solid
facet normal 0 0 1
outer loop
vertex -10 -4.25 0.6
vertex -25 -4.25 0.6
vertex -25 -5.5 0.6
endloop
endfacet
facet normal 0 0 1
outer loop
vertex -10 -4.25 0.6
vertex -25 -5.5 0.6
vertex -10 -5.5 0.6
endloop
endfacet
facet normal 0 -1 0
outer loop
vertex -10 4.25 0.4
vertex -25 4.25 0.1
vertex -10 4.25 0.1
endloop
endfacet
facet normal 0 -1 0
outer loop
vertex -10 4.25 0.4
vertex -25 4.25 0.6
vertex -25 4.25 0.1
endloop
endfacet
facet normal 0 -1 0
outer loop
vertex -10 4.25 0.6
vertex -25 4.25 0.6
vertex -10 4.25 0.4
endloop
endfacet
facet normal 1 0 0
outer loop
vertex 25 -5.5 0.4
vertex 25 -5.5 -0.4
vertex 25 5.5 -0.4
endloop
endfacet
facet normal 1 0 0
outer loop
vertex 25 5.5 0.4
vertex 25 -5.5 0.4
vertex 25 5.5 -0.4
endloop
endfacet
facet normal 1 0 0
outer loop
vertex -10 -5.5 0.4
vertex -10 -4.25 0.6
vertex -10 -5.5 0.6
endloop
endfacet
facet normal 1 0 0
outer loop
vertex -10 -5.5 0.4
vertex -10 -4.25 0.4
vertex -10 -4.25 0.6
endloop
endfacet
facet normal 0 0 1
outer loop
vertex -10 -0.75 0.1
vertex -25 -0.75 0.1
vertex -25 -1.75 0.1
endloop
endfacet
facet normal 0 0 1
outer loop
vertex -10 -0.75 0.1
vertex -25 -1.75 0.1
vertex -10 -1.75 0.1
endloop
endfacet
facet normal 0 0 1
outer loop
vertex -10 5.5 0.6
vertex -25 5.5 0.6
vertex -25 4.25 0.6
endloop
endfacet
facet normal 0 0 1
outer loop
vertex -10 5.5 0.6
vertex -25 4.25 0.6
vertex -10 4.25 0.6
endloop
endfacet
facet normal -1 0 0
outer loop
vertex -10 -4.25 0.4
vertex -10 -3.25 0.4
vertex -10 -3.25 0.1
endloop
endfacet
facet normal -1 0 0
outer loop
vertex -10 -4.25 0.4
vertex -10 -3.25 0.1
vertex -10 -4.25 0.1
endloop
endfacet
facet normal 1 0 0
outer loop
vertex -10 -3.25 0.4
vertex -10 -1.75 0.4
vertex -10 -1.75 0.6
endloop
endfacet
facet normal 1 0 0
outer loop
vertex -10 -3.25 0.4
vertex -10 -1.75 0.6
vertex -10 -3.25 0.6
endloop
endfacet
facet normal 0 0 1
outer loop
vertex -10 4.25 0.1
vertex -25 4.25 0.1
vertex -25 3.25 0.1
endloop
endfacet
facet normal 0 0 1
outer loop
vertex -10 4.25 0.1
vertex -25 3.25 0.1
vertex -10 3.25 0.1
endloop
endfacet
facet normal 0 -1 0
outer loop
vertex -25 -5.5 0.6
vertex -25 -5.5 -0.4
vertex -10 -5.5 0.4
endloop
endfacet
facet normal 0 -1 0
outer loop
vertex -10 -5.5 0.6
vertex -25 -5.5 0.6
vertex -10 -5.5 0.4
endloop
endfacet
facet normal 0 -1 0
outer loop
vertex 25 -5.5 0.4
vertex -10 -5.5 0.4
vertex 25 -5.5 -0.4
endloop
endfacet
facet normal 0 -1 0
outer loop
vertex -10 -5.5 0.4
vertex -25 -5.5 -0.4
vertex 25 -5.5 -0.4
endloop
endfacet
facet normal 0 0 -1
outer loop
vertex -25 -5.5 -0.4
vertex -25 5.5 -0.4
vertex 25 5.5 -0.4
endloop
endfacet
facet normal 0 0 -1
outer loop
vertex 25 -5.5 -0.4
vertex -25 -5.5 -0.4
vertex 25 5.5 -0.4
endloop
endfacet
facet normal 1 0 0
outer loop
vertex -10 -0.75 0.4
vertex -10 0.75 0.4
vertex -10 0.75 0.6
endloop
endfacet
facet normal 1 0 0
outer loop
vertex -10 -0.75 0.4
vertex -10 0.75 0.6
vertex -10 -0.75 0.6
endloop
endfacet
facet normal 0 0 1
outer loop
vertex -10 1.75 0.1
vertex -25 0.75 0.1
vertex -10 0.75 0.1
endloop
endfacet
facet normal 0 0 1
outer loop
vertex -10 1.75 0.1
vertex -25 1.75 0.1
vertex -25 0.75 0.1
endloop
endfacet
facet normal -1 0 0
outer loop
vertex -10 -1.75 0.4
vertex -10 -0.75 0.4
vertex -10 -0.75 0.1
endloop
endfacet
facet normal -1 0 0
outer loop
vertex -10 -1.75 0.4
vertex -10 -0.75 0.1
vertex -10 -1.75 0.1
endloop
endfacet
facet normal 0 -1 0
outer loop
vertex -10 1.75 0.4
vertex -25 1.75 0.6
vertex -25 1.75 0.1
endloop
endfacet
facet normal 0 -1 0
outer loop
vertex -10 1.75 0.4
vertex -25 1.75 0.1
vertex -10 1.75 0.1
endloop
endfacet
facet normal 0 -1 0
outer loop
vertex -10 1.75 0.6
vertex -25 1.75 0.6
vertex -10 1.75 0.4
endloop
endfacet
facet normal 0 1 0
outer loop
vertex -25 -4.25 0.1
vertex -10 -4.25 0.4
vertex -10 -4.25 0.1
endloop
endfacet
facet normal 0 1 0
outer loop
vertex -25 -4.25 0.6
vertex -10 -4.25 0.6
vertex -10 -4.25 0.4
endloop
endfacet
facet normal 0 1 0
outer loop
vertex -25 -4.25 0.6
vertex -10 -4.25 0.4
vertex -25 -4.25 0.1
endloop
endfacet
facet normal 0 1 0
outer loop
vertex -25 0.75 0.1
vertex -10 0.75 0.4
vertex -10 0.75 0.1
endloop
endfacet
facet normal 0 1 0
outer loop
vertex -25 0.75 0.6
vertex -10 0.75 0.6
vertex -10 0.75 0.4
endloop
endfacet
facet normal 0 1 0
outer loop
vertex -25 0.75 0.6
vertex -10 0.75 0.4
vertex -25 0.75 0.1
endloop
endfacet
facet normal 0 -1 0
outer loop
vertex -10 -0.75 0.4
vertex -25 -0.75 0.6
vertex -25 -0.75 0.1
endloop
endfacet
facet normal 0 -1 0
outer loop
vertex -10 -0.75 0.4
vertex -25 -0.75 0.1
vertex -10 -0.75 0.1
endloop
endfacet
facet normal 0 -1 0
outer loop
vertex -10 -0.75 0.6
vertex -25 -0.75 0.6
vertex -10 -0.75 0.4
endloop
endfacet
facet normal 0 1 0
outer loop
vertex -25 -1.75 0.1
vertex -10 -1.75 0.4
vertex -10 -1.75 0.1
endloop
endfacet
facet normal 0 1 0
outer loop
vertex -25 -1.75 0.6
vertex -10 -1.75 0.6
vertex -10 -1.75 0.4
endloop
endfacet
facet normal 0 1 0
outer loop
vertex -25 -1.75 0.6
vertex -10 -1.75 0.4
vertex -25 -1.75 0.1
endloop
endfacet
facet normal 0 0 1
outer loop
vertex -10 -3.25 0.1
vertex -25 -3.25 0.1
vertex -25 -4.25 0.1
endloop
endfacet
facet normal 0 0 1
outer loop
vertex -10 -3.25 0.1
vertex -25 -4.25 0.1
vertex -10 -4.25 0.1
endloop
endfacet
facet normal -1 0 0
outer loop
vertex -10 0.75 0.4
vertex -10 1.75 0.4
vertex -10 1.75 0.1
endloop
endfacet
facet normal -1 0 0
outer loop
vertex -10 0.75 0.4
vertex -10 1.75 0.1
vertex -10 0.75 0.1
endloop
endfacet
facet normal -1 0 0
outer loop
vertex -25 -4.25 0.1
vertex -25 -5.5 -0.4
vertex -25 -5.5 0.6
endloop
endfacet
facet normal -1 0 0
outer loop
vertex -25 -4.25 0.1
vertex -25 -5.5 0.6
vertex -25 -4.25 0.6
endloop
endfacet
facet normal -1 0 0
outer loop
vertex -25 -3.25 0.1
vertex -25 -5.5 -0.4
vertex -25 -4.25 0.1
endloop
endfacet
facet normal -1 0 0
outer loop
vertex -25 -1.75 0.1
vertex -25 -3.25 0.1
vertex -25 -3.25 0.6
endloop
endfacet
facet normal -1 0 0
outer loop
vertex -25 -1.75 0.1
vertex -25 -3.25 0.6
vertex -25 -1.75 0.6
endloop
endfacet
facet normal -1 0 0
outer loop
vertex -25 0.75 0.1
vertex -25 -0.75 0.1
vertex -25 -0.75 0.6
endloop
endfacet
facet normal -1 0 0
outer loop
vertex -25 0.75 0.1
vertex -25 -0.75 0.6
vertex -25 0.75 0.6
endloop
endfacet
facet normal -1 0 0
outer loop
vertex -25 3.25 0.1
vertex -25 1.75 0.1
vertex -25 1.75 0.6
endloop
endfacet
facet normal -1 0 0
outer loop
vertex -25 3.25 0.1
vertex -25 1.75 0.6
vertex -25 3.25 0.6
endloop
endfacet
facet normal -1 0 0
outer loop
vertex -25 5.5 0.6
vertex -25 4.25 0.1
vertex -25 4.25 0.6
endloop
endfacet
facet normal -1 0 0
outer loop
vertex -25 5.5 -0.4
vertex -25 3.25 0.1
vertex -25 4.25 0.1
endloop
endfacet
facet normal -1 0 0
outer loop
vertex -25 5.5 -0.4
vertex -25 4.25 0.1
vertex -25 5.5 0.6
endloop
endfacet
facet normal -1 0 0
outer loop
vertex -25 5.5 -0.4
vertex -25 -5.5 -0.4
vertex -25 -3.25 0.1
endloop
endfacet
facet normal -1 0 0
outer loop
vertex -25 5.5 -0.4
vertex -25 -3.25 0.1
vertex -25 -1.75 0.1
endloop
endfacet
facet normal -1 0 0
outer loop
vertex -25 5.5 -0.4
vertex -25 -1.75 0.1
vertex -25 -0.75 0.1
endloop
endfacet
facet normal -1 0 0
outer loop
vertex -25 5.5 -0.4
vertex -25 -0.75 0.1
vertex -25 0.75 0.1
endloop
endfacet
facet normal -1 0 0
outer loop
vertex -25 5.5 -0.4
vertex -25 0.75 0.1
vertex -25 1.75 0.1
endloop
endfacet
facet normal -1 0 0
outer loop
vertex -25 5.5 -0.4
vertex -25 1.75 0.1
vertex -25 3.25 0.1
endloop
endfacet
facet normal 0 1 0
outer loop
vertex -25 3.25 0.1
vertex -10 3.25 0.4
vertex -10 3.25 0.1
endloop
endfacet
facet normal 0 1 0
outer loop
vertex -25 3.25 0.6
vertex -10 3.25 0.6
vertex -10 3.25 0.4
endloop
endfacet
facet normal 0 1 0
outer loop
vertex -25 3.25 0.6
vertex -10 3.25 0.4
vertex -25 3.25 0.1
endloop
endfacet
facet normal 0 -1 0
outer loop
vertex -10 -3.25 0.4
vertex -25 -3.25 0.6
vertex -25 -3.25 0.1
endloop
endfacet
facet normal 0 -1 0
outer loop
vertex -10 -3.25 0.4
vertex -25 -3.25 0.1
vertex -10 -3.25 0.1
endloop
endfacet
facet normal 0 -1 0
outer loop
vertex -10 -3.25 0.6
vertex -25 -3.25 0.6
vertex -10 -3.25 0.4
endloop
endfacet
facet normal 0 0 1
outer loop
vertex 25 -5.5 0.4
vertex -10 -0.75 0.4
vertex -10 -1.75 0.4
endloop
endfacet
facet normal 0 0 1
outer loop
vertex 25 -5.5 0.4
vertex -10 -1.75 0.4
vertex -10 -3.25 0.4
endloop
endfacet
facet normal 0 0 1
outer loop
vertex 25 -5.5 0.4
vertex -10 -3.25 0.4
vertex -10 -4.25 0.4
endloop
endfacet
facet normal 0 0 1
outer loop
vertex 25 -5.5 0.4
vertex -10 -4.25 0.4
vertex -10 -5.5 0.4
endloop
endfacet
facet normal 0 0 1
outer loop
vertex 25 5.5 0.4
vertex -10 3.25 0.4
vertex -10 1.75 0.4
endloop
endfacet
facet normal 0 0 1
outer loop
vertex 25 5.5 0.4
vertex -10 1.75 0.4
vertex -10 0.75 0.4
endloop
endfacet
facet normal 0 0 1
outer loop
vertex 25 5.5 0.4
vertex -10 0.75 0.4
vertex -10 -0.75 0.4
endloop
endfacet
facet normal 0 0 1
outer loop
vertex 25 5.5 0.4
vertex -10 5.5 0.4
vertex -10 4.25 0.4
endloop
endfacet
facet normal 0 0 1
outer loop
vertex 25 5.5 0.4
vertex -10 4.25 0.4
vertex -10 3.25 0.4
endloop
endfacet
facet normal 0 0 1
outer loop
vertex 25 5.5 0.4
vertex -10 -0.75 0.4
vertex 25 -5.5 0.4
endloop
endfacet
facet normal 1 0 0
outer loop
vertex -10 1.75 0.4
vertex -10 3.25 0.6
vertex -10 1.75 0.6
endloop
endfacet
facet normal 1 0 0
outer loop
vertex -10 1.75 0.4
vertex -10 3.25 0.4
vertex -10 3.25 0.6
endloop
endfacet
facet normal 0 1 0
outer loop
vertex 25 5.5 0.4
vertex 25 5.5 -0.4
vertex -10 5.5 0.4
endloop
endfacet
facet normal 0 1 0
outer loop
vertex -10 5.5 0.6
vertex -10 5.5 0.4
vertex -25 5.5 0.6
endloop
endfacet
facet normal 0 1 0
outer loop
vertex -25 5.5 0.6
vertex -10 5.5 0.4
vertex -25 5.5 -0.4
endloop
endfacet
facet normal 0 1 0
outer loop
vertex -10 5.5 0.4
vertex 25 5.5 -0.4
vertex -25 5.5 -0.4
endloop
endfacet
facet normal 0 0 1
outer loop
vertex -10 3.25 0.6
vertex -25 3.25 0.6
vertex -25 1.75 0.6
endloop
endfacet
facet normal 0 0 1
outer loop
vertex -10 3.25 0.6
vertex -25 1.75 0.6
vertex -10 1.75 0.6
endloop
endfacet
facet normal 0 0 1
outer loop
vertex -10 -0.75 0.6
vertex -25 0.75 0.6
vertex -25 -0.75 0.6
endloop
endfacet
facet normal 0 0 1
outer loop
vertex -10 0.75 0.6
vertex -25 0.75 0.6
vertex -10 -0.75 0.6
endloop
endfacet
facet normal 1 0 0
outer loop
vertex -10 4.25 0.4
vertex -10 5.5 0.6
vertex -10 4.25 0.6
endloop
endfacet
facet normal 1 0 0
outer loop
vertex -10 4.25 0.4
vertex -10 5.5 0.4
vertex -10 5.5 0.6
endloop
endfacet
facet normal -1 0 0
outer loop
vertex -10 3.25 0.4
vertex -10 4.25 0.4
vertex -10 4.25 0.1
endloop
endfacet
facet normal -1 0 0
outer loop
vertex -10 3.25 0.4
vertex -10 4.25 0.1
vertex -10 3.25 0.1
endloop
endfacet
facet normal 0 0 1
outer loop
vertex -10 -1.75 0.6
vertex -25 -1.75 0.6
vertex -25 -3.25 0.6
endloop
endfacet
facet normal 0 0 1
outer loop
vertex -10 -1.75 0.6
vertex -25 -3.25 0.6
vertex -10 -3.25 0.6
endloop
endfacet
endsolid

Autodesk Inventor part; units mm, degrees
ref_plane "YZ Plane" through (0, 0, 0) normal (1, 0, 0) x (0, 1, 0)
ref_plane "XZ Plane" through (0, 0, 0) normal (0, 1, 0) x (-1, 0, 0)
sketch "Sketch1" plane through (0, 0, 0) normal (0, 0, 1) x (1, 0, 0)
  line L0 (-25, -5.5) -> (25, -5.5)
  line L1 (25, -5.5) -> (25, 5.5)
  line L2 (25, 5.5) -> (-25, 5.5)
  line L3 (-25, 5.5) -> (-25, -5.5)
  line L4 (-25, -5.5) -> (25, 5.5) construction
  line L5 (25, -5.5) -> (-25, 5.5) construction
  point P0 (0, 0)
  dimension "d0" = 50
  dimension "d1" = 11
extrude "Extrusion1" add sketch "Sketch1" along normal mid plane 0.8
sketch "Sketch2" plane through (0, 0, 0.4) normal (0, 0, 1) x (1, 0, 0)
  line L0 (25, 5.5) -> (-25, 5.5) projected
  line L1 (-25, -5.5) -> (25, -5.5) projected
  line L2 (-25, 5.5) -> (-10, 5.5)
  line L3 (-10, 5.5) -> (-10, -5.5)
  line L4 (-10, -5.5) -> (-25, -5.5)
  line L5 (-25, -5.5) -> (-25, 5.5)
  point P0 (0, 0)
  dimension "d4" = 15
  dimension "d5" = 11
extrude "Extrusion2" add sketch "Sketch2" along normal blind 0.2
sketch "Sketch3" plane through (0, 0, 0.6) normal (0, 0, 1) x (1, 0, 0)
  line L0 (-25, 4.25) -> (-10, 4.25)
  line L1 (-10, 4.25) -> (-10, 3.25)
  line L2 (-10, 3.25) -> (-25, 3.25)
  line L3 (-25, 3.25) -> (-25, 4.25)
  line L4 (-25, 5.5) -> (-25, -5.5) projected
  line L5 (-10, 5.5) -> (-25, 5.5) projected
  line L6 (-10, 0.75) -> (-25, 0.75)
  line L7 (-10, 1.75) -> (-10, 0.75)
  line L8 (-25, 1.75) -> (-10, 1.75)
  line L9 (-25, 0.75) -> (-25, 1.75)
  line L10 (-10, -1.75) -> (-25, -1.75)
  line L11 (-10, -0.75) -> (-10, -1.75)
  line L12 (-25, -0.75) -> (-10, -0.75)
  line L13 (-25, -1.75) -> (-25, -0.75)
  line L14 (-10, -4.25) -> (-25, -4.25)
  line L15 (-10, -3.25) -> (-10, -4.25)
  line L16 (-25, -3.25) -> (-10, -3.25)
  line L17 (-25, -4.25) -> (-25, -3.25)
  point P0 (0, 0)
  dimension "d8" = 15
  dimension "d9" = 1
  dimension "d10" = 1.25
  dimension "d13" = 2.5
extrude "Extrusion3" cut sketch "Sketch3" against normal blind 0.5
ref_plane "Work Plane1" through (0, 0, 20.4) normal (0, 0, 1) x (1, 0, 0)
sketch "Sketch4" plane through (0, 0, 20.4) normal (0, 0, 1) x (1, 0, 0)
  line L0 (-10, 5.5) -> (-25, 5.5) projected
  line L1 (-9.9335, 7.1739) -> (25.0665, 7.1739) construction
  line L2 (25.0665, 7.1739) -> (25.0665, -7.4481) construction
  line L3 (25.0665, -7.4481) -> (-9.9335, -7.4481) construction
  line L4 (-9.9335, -7.4481) -> (-9.9335, 7.1739) construction
  point P0 (0, 0)
  dimension "d56" = 35
decal "Decal1"
sketch "Sketch5" plane through (0, 0, 20.4) normal (0, 0, 1) x (1, 0, 0)
  point P0 (0, 0)
properties part number "Pen2" material "Acetal Resin, Black"
